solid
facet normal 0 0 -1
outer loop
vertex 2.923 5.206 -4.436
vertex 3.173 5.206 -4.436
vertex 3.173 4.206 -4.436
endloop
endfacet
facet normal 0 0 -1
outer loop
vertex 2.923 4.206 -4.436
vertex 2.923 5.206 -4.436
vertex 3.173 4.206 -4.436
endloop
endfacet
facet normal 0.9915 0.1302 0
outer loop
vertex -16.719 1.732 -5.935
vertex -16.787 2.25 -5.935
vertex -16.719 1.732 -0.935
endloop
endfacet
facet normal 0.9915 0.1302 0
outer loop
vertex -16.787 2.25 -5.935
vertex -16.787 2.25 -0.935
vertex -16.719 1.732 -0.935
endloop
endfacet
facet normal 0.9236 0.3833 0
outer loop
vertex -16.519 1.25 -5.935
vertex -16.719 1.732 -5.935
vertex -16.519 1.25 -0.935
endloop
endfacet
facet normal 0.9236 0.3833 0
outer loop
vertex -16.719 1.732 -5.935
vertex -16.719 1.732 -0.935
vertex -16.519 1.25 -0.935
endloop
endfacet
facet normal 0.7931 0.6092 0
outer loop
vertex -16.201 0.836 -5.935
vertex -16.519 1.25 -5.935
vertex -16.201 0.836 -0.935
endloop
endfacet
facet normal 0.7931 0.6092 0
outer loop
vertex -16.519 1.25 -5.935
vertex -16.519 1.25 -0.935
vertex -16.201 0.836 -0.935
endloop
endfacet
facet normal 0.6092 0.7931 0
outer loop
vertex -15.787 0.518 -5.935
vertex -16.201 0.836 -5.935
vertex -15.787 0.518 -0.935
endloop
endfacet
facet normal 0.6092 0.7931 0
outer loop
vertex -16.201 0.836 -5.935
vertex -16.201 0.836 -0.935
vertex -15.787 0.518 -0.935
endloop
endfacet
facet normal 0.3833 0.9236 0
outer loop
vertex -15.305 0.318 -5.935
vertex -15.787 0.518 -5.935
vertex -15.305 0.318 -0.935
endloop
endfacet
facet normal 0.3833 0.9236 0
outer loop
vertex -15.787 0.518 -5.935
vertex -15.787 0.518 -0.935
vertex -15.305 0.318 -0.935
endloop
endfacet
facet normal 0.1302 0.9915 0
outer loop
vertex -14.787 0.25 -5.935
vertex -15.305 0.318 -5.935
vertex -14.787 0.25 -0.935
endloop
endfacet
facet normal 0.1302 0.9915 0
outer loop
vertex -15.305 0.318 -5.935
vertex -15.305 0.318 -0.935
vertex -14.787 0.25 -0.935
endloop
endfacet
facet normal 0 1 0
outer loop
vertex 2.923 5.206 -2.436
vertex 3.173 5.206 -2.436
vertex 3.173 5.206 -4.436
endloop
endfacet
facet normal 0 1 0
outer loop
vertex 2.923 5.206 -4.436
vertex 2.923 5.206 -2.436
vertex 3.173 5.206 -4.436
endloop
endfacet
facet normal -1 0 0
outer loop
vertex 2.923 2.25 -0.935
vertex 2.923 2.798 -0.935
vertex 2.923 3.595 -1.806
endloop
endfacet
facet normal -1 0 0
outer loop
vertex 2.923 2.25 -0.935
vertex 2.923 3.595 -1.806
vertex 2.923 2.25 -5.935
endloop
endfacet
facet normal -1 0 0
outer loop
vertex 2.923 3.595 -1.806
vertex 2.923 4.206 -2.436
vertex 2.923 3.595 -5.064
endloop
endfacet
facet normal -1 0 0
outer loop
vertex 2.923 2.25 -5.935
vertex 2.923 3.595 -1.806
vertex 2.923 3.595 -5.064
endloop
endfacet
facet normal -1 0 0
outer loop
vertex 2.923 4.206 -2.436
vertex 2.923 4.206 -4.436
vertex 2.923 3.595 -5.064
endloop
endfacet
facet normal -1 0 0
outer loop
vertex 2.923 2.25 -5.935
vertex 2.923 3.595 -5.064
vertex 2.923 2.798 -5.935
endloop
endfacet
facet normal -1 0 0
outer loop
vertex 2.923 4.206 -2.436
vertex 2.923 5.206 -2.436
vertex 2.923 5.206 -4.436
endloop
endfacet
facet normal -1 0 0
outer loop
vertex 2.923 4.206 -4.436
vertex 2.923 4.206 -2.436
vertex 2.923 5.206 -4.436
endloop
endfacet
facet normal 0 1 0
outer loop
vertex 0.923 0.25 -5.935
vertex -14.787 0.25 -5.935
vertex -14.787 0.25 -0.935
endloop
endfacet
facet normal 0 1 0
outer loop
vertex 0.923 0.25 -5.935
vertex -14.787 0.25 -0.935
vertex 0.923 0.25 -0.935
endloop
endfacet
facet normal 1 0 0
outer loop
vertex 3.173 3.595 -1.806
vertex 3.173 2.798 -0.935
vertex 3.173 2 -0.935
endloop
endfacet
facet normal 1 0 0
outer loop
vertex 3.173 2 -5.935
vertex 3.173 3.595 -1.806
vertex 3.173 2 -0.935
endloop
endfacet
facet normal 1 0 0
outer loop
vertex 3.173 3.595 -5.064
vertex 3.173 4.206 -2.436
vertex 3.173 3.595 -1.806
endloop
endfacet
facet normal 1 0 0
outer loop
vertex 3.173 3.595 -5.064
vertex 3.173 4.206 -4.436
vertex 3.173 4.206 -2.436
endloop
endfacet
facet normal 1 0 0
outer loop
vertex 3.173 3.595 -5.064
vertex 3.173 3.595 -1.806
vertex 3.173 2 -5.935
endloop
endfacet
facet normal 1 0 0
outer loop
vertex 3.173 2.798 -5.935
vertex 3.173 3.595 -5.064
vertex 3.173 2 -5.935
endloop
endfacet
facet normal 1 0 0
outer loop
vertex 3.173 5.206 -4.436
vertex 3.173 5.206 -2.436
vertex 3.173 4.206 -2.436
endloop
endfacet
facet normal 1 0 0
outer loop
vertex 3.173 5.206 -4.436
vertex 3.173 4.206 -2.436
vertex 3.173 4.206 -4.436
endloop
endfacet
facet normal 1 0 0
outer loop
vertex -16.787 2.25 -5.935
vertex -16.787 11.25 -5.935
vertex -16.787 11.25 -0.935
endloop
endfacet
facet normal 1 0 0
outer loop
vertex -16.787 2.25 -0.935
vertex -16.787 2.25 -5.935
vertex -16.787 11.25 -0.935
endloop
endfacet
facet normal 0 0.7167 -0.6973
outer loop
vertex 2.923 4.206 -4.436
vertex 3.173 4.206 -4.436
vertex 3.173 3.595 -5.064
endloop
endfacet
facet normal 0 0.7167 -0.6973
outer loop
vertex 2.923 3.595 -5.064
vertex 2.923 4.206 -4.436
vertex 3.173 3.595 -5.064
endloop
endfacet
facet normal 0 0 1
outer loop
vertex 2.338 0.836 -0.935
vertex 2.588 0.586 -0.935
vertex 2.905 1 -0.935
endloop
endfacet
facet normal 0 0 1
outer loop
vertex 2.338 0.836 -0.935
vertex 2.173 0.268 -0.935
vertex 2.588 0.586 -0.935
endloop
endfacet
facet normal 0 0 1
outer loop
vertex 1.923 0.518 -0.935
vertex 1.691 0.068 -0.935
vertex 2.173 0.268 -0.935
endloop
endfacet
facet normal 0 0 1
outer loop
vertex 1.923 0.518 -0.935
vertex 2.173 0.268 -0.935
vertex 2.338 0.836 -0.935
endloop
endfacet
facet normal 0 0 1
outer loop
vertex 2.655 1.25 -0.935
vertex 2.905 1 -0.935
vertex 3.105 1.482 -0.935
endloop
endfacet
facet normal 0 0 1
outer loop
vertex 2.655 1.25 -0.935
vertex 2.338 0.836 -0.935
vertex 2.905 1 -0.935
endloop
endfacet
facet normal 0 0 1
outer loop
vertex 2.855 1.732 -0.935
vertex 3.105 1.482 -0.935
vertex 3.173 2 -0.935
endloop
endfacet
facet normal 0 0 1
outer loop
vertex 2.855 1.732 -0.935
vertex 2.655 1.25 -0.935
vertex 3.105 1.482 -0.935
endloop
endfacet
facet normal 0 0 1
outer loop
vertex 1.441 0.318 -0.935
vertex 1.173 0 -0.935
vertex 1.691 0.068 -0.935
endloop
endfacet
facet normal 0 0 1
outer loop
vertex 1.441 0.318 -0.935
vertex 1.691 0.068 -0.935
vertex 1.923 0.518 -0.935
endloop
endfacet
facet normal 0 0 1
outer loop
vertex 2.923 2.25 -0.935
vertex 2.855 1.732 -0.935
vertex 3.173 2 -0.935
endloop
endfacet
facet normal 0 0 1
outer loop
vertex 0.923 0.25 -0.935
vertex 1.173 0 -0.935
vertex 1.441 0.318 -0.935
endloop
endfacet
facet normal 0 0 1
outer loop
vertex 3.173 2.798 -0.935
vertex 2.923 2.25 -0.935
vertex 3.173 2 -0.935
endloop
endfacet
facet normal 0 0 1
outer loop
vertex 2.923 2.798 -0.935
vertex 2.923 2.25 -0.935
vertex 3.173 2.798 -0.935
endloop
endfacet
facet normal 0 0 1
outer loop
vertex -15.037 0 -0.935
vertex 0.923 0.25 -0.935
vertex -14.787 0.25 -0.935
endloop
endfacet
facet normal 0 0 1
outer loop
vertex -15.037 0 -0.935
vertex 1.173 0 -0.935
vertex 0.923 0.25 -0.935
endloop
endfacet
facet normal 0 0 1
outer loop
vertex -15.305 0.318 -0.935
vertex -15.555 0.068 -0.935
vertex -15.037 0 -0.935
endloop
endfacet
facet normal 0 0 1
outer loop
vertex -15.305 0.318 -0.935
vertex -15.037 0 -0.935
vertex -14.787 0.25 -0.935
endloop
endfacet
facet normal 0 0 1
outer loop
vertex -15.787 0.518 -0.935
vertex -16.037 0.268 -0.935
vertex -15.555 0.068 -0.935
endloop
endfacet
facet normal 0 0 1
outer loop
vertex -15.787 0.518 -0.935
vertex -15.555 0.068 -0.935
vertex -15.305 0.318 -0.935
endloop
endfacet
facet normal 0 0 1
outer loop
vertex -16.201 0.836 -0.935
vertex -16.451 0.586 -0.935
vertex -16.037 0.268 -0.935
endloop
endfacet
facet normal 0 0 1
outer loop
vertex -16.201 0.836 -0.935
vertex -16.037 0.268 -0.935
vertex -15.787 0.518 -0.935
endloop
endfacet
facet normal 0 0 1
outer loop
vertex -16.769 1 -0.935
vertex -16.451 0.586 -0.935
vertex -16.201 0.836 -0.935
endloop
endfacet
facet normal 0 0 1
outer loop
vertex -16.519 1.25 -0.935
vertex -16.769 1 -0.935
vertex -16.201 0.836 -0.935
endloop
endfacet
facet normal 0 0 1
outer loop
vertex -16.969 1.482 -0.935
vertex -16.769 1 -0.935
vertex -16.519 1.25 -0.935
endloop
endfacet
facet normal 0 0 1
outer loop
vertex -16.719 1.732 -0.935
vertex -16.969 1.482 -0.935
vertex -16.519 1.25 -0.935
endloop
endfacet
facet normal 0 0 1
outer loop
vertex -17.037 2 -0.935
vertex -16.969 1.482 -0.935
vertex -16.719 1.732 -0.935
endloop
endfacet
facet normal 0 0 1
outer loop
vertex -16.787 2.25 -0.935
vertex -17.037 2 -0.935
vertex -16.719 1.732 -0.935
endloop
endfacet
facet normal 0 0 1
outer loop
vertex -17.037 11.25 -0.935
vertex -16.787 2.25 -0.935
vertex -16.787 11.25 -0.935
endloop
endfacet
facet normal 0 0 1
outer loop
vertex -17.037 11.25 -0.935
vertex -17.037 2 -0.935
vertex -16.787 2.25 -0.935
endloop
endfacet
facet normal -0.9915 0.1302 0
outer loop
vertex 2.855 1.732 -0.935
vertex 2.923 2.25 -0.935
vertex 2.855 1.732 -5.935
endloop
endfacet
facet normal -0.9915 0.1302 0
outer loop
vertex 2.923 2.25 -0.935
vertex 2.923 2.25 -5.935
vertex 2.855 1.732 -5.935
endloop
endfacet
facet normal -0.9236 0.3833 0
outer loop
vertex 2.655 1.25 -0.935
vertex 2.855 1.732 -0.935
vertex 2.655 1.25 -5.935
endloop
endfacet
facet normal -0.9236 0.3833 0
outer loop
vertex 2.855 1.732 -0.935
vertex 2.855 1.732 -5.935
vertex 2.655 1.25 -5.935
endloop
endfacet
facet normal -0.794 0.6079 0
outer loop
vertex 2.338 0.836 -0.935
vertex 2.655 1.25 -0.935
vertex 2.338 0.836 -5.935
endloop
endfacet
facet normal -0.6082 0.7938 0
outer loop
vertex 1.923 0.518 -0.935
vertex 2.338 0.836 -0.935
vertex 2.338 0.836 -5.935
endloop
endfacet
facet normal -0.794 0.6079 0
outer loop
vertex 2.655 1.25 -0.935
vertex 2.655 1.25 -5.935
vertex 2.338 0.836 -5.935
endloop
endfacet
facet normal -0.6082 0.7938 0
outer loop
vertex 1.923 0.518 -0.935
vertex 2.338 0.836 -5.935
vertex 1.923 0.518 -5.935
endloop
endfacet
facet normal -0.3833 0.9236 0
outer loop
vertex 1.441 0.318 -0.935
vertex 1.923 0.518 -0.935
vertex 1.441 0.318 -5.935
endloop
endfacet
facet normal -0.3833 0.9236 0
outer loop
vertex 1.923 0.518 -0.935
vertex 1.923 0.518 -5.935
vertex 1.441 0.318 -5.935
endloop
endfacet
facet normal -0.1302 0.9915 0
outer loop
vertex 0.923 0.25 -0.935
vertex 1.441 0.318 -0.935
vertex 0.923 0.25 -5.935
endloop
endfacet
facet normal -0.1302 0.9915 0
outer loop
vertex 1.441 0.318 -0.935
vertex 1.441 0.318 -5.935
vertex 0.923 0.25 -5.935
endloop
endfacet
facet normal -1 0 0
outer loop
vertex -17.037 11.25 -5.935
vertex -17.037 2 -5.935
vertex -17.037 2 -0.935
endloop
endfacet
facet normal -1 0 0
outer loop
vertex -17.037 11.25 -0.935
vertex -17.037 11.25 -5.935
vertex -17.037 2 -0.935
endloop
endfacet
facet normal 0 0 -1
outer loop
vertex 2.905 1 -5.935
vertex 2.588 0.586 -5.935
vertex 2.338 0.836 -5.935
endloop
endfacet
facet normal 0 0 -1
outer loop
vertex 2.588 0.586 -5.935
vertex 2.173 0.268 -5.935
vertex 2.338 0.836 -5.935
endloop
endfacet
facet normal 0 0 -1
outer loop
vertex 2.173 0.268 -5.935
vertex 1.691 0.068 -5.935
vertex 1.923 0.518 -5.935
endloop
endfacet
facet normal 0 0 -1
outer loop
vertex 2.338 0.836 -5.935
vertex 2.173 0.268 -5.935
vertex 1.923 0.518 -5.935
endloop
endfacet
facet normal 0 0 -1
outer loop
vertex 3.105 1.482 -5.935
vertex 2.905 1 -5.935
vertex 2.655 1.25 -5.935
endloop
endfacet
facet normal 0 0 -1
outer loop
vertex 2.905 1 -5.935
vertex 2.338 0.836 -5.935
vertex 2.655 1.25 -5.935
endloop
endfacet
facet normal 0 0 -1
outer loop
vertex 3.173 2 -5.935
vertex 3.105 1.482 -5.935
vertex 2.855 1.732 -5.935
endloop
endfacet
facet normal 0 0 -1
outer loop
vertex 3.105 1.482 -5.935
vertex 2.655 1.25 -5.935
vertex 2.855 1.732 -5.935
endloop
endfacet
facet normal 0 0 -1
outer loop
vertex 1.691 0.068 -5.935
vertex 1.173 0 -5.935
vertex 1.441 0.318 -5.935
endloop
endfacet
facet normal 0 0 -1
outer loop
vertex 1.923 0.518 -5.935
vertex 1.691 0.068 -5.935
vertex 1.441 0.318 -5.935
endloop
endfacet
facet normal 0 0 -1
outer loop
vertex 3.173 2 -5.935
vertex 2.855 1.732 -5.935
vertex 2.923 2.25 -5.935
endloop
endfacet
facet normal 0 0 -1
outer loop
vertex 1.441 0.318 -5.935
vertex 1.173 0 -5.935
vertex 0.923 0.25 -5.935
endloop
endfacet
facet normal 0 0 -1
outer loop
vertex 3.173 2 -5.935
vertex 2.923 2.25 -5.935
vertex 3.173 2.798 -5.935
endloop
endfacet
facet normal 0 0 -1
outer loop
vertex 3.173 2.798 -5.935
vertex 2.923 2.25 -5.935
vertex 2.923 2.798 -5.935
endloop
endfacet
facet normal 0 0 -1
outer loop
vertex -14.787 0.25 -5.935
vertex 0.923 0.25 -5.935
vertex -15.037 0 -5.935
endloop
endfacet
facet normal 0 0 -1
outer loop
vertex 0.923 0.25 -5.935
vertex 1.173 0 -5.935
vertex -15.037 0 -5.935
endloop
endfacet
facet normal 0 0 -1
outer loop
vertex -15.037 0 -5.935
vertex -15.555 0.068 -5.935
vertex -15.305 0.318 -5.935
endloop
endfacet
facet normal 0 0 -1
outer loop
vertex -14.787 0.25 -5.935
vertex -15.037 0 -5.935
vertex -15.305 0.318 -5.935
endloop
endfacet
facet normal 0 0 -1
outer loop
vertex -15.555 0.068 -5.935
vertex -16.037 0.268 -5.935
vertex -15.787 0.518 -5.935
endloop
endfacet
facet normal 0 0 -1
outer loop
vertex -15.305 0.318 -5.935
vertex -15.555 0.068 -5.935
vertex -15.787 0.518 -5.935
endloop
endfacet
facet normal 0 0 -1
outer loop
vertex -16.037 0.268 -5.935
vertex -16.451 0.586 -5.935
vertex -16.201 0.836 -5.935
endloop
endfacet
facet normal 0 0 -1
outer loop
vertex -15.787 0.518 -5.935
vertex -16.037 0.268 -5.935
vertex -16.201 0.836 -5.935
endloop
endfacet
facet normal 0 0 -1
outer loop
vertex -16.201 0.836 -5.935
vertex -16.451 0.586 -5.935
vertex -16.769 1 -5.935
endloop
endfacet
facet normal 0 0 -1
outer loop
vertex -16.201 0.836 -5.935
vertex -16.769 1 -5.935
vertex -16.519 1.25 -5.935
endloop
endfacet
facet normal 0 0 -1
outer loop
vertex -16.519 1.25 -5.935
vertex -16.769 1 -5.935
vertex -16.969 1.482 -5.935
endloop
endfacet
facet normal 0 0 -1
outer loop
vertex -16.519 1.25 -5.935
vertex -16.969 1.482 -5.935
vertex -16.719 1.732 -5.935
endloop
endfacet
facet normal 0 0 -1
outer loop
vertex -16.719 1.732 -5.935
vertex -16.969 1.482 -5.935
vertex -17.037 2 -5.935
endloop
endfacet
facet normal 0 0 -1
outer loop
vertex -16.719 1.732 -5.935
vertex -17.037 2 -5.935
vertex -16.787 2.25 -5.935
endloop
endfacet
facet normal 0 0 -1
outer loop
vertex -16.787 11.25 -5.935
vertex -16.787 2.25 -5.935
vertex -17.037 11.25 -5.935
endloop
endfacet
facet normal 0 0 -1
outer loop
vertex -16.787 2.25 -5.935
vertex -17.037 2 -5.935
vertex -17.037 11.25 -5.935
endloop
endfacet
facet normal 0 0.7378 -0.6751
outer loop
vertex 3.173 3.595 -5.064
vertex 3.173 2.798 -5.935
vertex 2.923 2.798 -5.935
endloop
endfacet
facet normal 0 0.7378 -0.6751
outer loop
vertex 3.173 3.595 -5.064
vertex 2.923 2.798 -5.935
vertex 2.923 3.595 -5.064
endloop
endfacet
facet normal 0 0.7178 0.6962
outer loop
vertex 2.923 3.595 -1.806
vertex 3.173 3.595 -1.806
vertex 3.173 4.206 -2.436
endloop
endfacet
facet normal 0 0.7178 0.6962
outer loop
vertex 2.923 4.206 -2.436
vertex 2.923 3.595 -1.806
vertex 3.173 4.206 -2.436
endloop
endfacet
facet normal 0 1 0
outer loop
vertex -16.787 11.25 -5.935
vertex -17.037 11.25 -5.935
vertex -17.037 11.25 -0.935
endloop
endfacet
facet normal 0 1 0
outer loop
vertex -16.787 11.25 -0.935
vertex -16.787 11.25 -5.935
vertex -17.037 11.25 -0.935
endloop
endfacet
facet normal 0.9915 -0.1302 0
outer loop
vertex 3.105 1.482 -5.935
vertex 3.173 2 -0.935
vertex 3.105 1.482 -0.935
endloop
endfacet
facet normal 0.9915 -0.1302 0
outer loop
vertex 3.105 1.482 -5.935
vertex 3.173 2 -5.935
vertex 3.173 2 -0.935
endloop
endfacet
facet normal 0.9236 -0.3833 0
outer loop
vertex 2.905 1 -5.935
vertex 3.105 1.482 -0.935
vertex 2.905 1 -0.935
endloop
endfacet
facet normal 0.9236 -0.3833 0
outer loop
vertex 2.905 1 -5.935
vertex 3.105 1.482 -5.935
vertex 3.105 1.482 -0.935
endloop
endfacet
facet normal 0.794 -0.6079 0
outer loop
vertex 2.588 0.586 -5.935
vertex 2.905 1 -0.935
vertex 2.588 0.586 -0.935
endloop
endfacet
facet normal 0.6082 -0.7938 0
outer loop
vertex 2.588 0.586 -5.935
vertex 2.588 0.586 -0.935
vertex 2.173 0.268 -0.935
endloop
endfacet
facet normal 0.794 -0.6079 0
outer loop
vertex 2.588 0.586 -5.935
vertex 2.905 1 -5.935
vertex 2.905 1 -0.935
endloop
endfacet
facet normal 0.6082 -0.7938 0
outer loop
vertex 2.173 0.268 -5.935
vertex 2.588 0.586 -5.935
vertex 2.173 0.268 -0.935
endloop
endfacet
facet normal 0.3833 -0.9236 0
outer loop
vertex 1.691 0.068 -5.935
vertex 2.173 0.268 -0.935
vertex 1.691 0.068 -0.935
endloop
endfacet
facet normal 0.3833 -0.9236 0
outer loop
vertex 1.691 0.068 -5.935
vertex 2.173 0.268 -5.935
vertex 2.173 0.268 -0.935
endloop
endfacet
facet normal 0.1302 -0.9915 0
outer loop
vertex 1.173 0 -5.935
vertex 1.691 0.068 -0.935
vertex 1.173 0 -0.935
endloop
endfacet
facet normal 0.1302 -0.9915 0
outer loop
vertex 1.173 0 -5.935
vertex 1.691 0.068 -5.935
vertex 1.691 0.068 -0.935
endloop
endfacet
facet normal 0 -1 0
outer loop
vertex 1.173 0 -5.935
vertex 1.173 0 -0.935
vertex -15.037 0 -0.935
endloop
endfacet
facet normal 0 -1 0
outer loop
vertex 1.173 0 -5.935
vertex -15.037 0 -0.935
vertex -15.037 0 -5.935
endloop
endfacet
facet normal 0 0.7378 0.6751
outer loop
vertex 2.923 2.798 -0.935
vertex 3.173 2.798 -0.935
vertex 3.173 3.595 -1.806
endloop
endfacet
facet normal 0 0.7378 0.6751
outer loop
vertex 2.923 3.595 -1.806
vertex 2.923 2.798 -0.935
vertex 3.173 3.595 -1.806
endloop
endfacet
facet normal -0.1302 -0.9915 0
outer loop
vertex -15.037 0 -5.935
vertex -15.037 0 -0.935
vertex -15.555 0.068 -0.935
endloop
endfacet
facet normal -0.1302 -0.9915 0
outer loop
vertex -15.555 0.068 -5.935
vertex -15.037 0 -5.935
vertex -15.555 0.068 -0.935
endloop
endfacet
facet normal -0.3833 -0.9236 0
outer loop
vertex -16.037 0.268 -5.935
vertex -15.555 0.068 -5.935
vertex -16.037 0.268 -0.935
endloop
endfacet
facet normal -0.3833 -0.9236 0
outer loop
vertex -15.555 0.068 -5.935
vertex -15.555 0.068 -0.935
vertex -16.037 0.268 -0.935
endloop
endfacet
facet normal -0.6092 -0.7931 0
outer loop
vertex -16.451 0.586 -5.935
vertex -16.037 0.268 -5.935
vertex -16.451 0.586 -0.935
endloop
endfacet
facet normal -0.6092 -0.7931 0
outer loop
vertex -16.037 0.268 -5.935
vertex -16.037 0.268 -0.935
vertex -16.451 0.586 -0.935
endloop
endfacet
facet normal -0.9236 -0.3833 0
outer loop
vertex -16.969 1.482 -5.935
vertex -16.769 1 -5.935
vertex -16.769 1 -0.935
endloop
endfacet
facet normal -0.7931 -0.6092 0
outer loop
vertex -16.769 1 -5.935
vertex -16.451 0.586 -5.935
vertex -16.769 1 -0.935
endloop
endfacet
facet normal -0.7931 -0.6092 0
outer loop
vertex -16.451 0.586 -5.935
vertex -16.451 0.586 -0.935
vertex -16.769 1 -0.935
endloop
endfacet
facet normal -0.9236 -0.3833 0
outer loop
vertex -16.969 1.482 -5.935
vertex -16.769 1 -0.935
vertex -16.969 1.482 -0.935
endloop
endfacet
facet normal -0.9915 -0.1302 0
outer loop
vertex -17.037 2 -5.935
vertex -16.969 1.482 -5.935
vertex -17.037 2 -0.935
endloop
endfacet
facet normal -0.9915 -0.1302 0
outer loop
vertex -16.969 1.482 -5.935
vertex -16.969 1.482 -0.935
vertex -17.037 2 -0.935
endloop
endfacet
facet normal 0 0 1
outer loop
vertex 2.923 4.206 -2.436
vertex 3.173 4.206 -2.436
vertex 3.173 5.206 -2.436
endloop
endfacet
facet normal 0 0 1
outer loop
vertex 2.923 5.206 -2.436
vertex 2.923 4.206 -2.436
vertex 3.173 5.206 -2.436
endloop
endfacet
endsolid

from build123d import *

# Parameters (mm, degrees)
SKETCH1_W           = 28.6
SKETCH1_H           = 5
BOSS_EXTRUDE1_DEPTH = 0.25
SKETCH2_W           = 5
SKETCH2_H           = 11
BOSS_EXTRUDE2_DEPTH = 0.25
BOSS_EXTRUDE3_DEPTH = 0.25
FILLET3_R           = 2
FILLET4_R           = 2
SKETCH4_W           = 6.639451807
SKETCH4_H           = 5
CUT_EXTRUDE1_DEPTH  = 1.5
SKETCH5_W           = 5
SKETCH5_H           = 3.595357205
BOSS_EXTRUDE4_DEPTH = 0.25
FILLET5_R           = 2
FILLET6_R           = 2
BOSS_EXTRUDE5_DEPTH = 0.25
CUT_EXTRUDE2_DEPTH  = 0.25
SKETCH8_W           = 6.875858175
SKETCH8_H           = 9.336027613
CUT_EXTRUDE3_DEPTH  = 5.25


with BuildPart() as part:
    # Sketch1 → Boss-Extrude1 (new body)
    with BuildSketch(Plane(origin=(0, 0, 0), x_dir=(1, 0, 0), z_dir=(0, 1, 0))):
        with Locations((-2.737209302, 3.434883721)):
            Rectangle(SKETCH1_W, SKETCH1_H)
    extrude(amount=BOSS_EXTRUDE1_DEPTH)

    # Sketch2 → Boss-Extrude2 (add)
    with BuildSketch(Plane.ZY.offset(17.037209302)):
        with Locations((-3.434883721, 5.75)):
            Rectangle(SKETCH2_W, SKETCH2_H)
    extrude(amount=-BOSS_EXTRUDE2_DEPTH)

    # Sketch3 → Boss-Extrude3 (add)
    with BuildSketch(Plane(origin=(11.562790698, 0, 0), x_dir=(0, 0, -1), z_dir=(1, 0, 0))):
        Polygon((0.934883721, 0.25), (5.936255285, 0.25), (5.936255285, 2.75), (4.435569503, 4.205909665), (4.435569503, 5.205909665), (3.435569503, 5.205909665), (2.435569503, 5.205909665), (2.435569503, 4.205909665), (0.934883721, 2.75), align=None)
    extrude(amount=-BOSS_EXTRUDE3_DEPTH)

    # Fillet3
    fillet3_edges = [part.edges().sort_by_distance(p)[0] for p in [
        (-16.787209302, 0.25, -3.434883721),
        (11.312790698, 0.25, -3.434883721),
    ]]
    fillet(fillet3_edges, radius=FILLET3_R)

    # Fillet4
    # the kernel refuses this fillet: 2 mm, written as the material it takes off along each edge
    with BuildSketch(Plane(origin=(11.562790698, 0, -10.934883721), x_dir=(-1, 0, 0), z_dir=(0, 0, 1))) as fillet4_piece_1:
        with BuildLine():
            CenterArc((FILLET4_R, -FILLET4_R), FILLET4_R, 90, 90)
            Line((0, -FILLET4_R), (0, 0))
            Line((0, 0), (FILLET4_R, 0))
        make_face()
    extrude(amount=15, mode=Mode.SUBTRACT)
    with BuildSketch(Plane(origin=(-17.037209302, 0, 4.065116279), x_dir=(0, 1, 0), z_dir=(0, 0, -1))) as fillet4_piece_2:
        with BuildLine():
            CenterArc((FILLET4_R, FILLET4_R), FILLET4_R, 180, 90)
            Line((0, FILLET4_R), (0, 0))
            Line((0, 0), (FILLET4_R, 0))
        make_face()
    extrude(amount=15, mode=Mode.SUBTRACT)

    # Sketch4 → Cut-Extrude1 (cut)
    with BuildSketch(Plane.XZ):
        with Locations((6.243064795, -3.434883721)):
            Rectangle(SKETCH4_W, SKETCH4_H)
    extrude(amount=-CUT_EXTRUDE1_DEPTH, mode=Mode.SUBTRACT)


with BuildPart() as cut_extrude1_piece_1:
    # of the separate pieces the step leaves, piece 1, a body of its own (cut_extrude1_pieces)
    add(part.part.solids().sort_by_distance((-16.787209302, 2.25, -5.934883721))[0])

    # Sketch5 → Boss-Extrude4 (add)
    with BuildSketch(Plane(origin=(2.923338891, 0, 0), x_dir=(0, 0, -1), z_dir=(1, 0, 0))):
        with Locations((3.434883721, 1.797678603)):
            Rectangle(SKETCH5_W, SKETCH5_H)
    extrude(amount=BOSS_EXTRUDE4_DEPTH)

    # Fillet5
    fillet5_edges = [cut_extrude1_piece_1.edges().sort_by_distance(p)[0] for p in [
        (2.923338891, 0.25, -3.434883721),
    ]]
    fillet(fillet5_edges, radius=FILLET5_R)

    # Fillet6
    fillet6_edges = [cut_extrude1_piece_1.edges().sort_by_distance(p)[0] for p in [
        (3.173338891, 0, -3.434883721),
    ]]
    fillet(fillet6_edges, radius=FILLET6_R)

    # Sketch6 → Boss-Extrude5 (add)
    with BuildSketch(Plane(origin=(3.173338891, 0, 0), x_dir=(0, 0, -1), z_dir=(1, 0, 0))):
        Polygon((0.934883721, 2.75), (2.435569503, 4.205909665), (2.435569503, 5.205909665), (4.435569503, 5.205909665), (4.435569503, 4.205909665), (5.934883721, 2.75), align=None)
    extrude(amount=-BOSS_EXTRUDE5_DEPTH)

    # Sketch7 → Cut-Extrude2 (cut)
    with BuildSketch(Plane(origin=(3.173338891, 0, 0), x_dir=(0, 0, -1), z_dir=(1, 0, 0))):
        Polygon((1.806239664, 3.595357205), (0.934883721, 3.595357205), (0.934883721, 2.797678603), align=None)
        Polygon((5.064324161, 3.595357205), (5.934883721, 3.595357205), (5.934883721, 2.797678603), align=None)
    extrude(amount=-CUT_EXTRUDE2_DEPTH, mode=Mode.SUBTRACT)


with BuildPart() as cut_extrude1_piece_2:
    # of the separate pieces the step leaves, piece 2, a body of its own (cut_extrude1_pieces)
    add(part.part.solids().sort_by_distance((9.562790698, 0, -5.934883721))[0])

    # Sketch8 → Cut-Extrude3 (cut)
    with BuildSketch(Plane(origin=(0, 0, -5.936255285), x_dir=(-1, 0, 0), z_dir=(0, 0, -1))):
        with Locations((-11.197633492, 2.582921844)):
            Rectangle(SKETCH8_W, SKETCH8_H)
    extrude(amount=-CUT_EXTRUDE3_DEPTH, mode=Mode.SUBTRACT)


solid = cut_extrude1_piece_1.part
